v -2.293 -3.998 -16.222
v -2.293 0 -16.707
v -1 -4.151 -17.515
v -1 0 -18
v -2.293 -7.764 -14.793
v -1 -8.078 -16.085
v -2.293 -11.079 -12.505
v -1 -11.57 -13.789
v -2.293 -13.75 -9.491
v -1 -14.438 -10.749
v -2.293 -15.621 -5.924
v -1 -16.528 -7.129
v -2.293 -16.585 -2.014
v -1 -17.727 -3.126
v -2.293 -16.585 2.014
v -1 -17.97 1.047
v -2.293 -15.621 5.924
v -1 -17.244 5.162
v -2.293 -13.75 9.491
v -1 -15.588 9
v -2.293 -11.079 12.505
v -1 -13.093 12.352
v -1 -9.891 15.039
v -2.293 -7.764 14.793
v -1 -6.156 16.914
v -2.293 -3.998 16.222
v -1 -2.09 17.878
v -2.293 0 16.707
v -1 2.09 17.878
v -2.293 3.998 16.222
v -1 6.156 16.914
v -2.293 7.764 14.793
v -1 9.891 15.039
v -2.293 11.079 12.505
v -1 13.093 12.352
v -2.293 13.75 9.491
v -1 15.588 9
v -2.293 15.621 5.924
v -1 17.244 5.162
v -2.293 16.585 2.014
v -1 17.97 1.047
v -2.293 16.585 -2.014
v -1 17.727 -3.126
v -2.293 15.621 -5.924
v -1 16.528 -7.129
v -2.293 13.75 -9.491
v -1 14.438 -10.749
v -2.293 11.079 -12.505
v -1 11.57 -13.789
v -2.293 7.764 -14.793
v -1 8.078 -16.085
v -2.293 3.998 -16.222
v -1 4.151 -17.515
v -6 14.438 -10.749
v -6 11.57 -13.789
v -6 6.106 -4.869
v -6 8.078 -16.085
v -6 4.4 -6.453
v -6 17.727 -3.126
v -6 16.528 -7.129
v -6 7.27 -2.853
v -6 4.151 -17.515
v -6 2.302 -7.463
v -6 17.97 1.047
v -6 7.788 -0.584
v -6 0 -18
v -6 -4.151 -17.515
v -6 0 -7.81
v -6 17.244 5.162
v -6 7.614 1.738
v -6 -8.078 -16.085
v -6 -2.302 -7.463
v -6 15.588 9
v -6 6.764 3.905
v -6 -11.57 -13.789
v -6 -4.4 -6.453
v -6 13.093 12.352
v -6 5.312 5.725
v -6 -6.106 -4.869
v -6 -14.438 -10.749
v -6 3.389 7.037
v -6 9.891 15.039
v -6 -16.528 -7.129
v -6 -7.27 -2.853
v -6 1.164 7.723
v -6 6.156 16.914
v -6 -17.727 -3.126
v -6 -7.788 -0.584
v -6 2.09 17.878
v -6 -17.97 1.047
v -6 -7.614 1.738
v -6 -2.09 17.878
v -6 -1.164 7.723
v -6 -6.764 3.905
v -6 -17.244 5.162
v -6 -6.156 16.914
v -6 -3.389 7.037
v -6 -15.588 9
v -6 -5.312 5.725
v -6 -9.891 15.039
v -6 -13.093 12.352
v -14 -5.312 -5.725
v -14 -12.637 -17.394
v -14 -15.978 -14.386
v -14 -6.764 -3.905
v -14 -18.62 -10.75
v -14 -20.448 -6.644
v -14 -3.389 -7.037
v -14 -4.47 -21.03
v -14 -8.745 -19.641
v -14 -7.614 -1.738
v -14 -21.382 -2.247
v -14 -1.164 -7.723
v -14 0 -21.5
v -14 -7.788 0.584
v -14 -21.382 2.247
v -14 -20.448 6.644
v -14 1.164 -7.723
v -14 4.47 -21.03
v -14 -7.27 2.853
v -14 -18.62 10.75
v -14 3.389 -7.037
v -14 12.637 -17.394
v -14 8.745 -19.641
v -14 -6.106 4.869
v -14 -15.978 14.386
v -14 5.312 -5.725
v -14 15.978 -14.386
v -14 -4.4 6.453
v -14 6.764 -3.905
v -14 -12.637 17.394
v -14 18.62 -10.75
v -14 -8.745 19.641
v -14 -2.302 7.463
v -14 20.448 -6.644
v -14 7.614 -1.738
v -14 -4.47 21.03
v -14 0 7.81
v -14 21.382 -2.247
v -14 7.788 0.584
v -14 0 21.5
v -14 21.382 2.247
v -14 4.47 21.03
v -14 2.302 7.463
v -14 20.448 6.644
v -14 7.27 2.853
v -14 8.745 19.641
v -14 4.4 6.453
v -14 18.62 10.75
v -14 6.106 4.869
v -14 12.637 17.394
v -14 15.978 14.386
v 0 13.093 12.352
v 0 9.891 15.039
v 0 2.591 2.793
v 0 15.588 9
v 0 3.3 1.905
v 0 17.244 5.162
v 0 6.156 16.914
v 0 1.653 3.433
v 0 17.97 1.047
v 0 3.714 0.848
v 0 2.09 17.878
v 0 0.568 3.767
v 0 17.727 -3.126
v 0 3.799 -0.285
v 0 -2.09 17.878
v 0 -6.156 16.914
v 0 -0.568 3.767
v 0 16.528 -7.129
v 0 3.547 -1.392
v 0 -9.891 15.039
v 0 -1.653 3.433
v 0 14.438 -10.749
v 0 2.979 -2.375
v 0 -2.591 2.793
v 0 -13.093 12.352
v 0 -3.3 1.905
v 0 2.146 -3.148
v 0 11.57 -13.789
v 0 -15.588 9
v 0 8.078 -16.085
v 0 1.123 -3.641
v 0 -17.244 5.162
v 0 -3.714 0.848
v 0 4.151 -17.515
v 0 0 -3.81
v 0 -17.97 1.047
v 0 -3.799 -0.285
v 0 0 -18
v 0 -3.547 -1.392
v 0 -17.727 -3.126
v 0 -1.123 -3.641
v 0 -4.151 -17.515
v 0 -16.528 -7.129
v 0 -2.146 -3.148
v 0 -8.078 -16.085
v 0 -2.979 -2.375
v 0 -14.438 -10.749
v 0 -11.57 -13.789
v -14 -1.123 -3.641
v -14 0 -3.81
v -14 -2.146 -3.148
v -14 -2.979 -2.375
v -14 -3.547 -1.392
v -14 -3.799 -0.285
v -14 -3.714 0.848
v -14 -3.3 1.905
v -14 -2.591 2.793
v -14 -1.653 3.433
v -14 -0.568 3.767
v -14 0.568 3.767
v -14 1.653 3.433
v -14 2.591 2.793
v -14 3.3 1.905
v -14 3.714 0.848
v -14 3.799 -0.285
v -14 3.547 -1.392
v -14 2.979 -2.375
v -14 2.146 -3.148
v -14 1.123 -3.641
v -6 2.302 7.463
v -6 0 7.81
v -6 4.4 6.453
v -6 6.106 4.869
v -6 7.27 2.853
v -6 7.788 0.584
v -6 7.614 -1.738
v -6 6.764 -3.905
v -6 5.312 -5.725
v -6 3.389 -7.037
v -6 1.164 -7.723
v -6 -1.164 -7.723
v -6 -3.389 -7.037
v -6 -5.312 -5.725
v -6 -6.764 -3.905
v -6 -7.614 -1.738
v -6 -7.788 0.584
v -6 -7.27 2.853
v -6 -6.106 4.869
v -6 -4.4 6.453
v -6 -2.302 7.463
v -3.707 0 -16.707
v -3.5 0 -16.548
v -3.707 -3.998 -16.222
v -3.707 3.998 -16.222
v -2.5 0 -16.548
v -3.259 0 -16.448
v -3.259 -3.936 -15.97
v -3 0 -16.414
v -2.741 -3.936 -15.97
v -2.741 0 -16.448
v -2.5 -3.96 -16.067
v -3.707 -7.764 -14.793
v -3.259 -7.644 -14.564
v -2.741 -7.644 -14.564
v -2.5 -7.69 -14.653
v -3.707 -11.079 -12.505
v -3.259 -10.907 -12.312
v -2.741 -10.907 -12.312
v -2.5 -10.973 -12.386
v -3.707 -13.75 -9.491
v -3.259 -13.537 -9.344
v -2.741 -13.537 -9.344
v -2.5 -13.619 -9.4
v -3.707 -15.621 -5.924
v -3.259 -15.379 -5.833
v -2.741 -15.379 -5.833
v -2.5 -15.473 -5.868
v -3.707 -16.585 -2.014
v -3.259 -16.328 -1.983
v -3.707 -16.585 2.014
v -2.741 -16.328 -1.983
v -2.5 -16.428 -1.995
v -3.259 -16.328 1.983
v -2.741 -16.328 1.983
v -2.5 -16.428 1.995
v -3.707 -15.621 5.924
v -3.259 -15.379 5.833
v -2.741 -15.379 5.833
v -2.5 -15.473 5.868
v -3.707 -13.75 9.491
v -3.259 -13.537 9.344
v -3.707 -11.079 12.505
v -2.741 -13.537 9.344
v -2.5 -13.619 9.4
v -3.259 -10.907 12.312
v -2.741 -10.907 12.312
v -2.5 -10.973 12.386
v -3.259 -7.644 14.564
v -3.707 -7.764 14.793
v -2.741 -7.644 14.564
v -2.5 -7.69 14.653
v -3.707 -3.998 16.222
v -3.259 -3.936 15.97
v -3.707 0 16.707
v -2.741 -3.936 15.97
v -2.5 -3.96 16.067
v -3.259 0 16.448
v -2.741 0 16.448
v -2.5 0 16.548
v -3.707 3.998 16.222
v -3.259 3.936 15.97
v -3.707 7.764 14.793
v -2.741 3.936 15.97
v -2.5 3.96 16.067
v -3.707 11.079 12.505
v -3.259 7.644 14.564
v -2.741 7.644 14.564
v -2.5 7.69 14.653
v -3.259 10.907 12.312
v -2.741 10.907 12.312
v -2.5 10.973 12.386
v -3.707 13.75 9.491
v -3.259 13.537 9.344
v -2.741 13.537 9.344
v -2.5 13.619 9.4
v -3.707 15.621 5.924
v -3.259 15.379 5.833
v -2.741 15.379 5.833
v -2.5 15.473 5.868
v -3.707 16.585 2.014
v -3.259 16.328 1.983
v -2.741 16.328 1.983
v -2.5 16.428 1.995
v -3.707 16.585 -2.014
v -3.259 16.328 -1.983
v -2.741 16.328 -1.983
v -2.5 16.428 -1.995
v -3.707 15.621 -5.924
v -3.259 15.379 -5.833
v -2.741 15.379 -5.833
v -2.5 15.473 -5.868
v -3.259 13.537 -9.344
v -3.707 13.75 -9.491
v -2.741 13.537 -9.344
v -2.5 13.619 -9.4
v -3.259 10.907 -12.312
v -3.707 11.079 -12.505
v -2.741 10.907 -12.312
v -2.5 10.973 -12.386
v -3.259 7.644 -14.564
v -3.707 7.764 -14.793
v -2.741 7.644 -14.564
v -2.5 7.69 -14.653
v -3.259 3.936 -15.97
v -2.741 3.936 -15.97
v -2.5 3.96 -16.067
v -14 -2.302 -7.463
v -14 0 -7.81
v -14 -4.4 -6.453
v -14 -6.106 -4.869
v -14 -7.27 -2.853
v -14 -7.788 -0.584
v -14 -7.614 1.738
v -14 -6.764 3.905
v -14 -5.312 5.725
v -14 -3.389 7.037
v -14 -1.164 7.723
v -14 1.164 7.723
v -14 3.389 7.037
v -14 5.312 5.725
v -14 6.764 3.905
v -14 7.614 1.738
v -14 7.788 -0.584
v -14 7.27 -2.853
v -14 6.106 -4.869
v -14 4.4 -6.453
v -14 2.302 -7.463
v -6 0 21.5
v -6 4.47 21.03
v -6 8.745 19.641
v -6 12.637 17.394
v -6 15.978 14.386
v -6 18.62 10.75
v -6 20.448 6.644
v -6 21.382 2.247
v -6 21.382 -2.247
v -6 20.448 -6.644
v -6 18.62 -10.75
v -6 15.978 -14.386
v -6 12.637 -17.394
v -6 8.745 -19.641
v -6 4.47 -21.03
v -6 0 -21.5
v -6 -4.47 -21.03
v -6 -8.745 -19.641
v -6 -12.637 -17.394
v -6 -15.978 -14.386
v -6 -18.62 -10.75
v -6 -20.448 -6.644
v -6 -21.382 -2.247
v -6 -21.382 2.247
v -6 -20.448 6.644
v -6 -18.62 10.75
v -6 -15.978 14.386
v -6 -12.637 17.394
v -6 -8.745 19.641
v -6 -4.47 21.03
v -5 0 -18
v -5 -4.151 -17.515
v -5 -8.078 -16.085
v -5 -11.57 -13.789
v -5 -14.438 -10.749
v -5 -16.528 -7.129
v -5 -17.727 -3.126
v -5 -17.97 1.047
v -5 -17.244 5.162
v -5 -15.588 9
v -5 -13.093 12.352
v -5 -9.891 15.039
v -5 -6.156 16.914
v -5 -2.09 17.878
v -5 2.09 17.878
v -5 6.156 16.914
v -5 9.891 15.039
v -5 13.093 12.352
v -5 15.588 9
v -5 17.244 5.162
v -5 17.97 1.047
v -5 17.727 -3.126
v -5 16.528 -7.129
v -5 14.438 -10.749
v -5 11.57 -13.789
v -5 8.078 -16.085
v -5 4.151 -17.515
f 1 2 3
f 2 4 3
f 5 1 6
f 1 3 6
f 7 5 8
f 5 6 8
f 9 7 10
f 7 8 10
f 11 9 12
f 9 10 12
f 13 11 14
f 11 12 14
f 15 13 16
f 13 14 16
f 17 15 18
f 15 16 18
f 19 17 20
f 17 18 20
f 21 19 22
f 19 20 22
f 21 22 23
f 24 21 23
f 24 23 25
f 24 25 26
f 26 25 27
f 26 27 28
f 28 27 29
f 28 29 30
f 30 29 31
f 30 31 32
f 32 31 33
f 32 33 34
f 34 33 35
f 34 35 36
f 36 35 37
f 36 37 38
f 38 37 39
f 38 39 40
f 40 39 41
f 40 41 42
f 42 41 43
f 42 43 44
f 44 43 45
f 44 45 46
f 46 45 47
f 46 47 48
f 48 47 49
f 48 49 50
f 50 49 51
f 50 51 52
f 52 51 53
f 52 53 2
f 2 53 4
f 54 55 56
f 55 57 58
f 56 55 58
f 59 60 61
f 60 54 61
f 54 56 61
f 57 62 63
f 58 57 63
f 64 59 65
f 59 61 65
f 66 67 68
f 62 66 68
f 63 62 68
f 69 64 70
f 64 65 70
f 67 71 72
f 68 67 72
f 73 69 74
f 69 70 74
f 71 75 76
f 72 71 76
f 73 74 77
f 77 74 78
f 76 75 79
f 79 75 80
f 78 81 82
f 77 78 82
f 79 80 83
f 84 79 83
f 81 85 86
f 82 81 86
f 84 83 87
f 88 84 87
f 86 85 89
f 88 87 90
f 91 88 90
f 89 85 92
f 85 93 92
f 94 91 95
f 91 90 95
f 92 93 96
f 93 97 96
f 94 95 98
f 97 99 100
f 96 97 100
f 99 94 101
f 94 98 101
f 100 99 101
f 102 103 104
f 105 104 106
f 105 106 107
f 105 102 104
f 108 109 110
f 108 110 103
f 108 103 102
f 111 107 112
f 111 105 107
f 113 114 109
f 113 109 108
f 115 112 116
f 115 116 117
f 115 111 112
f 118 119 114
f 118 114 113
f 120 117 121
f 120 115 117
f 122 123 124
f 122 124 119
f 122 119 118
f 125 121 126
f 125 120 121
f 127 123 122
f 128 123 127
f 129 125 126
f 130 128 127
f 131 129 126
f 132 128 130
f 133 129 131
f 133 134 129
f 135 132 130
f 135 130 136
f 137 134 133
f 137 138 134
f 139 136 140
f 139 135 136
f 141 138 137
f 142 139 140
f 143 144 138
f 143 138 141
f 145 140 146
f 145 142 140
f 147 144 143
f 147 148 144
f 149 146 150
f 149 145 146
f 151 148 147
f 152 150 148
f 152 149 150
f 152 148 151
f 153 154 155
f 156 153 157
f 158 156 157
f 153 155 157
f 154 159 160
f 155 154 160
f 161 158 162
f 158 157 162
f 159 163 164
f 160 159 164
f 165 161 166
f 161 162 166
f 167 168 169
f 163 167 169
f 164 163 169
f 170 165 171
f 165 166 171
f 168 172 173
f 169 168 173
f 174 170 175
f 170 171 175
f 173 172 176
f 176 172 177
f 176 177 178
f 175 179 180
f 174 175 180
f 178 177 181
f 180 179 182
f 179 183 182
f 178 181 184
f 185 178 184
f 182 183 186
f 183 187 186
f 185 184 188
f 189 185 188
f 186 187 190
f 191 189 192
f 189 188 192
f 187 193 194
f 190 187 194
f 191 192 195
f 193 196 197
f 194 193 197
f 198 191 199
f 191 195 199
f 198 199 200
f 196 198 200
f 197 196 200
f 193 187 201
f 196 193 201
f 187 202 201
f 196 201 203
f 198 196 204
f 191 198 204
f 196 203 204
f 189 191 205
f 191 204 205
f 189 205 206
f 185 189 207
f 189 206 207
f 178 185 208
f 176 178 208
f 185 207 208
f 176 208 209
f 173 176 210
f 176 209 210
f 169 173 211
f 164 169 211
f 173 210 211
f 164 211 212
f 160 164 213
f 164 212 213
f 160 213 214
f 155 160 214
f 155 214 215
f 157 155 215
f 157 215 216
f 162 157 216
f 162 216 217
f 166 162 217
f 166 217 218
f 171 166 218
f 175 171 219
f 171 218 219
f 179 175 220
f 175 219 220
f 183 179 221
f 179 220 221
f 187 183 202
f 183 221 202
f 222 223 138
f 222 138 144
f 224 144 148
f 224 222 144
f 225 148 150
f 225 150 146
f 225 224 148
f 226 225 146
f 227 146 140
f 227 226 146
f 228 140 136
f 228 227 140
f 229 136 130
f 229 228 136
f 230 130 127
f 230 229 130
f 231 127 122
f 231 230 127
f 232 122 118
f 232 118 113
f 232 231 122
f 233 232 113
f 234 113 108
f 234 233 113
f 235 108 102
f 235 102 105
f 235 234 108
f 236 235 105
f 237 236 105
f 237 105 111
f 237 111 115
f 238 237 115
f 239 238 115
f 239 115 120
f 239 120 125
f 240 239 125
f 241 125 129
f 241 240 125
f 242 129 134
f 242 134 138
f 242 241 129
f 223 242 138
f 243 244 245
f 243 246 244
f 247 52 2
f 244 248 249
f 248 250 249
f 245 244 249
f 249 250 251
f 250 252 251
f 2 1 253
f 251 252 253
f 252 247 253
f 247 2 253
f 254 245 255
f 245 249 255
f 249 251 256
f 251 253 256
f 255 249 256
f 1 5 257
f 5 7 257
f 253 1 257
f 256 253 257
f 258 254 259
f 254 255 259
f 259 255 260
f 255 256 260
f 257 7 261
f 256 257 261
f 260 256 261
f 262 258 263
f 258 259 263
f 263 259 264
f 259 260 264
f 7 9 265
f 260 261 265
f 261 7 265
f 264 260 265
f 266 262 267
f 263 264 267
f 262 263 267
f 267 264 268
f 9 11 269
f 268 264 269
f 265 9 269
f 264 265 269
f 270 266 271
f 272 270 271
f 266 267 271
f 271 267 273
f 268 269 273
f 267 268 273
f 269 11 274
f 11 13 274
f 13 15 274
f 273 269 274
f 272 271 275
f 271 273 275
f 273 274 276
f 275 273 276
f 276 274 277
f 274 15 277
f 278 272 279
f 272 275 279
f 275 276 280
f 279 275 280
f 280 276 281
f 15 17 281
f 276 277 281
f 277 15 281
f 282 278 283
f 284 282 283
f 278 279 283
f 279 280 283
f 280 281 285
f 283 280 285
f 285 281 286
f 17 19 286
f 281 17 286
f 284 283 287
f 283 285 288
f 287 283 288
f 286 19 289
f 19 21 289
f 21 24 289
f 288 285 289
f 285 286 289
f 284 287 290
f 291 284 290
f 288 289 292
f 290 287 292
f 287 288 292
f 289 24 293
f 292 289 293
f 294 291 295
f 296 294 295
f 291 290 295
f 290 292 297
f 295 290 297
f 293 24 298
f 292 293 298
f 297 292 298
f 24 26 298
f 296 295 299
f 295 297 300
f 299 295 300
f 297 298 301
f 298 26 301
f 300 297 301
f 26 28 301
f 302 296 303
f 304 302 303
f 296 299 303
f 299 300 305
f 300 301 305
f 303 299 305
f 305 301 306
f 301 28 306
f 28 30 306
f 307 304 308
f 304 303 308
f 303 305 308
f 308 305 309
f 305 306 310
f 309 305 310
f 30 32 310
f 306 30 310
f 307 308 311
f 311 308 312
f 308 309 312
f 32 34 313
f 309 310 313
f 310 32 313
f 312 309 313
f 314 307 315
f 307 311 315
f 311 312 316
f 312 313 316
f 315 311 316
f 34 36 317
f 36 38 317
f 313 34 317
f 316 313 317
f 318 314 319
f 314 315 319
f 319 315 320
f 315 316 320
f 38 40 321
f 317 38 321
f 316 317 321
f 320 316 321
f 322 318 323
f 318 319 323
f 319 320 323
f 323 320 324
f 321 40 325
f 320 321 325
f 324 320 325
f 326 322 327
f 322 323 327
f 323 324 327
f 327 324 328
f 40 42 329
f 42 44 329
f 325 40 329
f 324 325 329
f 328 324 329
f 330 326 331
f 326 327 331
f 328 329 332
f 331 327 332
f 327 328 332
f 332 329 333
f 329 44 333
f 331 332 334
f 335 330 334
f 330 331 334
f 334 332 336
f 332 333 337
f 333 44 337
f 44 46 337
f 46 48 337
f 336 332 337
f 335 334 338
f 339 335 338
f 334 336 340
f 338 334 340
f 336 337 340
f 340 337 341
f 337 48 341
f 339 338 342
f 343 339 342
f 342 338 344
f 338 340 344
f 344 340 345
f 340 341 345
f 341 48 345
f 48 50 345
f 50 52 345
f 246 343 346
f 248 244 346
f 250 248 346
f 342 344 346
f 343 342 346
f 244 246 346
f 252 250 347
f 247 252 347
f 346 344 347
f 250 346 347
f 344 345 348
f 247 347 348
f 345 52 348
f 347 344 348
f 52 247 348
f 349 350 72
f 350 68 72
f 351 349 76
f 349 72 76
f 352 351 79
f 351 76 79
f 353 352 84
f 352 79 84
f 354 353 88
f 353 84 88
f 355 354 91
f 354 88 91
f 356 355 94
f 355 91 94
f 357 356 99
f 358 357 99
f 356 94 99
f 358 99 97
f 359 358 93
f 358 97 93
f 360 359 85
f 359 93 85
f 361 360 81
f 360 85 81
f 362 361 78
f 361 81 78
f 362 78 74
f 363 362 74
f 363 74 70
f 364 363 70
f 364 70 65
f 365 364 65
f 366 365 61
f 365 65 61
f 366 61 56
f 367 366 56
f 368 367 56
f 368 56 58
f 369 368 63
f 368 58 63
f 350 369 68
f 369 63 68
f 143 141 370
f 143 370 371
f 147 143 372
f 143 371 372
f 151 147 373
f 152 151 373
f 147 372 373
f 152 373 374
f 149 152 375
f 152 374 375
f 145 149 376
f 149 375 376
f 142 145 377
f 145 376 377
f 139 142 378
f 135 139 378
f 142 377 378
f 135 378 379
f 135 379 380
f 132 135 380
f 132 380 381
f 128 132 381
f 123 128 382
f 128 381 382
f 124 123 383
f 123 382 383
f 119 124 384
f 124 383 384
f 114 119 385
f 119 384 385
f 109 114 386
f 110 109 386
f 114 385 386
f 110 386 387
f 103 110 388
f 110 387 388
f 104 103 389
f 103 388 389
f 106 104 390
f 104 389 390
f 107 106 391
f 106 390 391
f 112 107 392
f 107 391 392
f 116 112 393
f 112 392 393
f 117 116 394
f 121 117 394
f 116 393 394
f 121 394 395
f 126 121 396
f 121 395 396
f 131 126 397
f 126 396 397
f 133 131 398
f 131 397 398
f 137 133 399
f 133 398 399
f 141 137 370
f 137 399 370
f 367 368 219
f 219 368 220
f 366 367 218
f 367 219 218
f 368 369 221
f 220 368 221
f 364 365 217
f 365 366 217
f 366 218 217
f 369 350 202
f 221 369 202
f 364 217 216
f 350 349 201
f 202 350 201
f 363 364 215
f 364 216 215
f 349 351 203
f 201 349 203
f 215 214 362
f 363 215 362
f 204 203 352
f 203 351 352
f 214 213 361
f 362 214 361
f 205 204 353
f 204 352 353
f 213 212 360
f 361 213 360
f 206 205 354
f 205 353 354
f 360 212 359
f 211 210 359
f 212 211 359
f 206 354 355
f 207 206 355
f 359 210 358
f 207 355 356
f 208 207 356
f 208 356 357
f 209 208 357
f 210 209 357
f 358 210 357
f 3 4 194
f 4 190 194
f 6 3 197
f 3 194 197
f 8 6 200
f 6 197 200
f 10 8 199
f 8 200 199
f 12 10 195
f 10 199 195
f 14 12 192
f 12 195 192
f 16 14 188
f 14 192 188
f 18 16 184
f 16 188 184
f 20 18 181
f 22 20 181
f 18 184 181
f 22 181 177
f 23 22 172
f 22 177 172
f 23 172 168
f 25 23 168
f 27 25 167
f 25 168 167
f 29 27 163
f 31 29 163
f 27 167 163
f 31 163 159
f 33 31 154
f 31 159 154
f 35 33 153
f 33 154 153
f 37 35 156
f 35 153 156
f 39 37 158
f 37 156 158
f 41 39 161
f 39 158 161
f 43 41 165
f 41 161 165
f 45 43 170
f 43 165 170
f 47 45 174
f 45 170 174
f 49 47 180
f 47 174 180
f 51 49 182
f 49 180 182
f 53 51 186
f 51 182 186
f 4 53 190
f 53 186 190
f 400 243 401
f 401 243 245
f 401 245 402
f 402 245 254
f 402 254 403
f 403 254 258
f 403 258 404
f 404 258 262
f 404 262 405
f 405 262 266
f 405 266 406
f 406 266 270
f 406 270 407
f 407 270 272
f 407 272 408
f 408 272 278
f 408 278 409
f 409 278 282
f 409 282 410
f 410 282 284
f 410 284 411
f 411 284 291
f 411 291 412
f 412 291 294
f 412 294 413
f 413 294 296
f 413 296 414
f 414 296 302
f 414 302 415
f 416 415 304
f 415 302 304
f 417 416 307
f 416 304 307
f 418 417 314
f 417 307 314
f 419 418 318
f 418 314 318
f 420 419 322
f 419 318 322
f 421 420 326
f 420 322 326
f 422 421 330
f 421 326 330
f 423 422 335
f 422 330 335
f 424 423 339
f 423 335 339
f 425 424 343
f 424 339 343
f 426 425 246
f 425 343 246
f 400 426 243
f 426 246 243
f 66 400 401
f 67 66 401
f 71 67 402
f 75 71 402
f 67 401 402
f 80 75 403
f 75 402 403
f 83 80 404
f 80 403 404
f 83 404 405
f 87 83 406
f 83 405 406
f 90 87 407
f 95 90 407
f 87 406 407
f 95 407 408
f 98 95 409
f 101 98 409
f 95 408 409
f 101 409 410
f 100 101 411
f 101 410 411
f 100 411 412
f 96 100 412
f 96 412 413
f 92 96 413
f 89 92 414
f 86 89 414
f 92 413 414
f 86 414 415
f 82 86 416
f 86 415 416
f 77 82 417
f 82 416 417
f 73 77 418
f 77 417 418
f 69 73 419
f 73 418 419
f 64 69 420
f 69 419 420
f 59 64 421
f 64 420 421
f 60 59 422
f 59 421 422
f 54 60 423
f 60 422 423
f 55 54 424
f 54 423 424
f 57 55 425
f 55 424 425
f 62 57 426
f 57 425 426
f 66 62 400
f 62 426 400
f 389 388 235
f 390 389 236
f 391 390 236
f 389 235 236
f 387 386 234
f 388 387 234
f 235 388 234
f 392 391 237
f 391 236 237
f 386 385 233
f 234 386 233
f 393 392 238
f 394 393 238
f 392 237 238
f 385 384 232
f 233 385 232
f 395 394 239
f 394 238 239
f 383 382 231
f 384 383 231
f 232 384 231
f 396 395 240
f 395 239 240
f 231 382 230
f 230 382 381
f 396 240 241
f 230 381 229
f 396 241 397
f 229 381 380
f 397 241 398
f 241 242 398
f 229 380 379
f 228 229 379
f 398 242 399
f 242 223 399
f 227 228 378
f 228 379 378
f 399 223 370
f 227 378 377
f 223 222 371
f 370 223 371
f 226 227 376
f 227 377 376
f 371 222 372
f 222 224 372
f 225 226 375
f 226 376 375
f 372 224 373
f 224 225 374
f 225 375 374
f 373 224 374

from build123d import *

# Parameters (mm, degrees)
SKETCH3_R           = 21.5
SKETCH3_R_2         = 7.81
BOSS_EXTRUDE1_DEPTH = 8


with BuildPart() as part:
    # Sketch1 → Revolve1 (revolve)
    with BuildSketch(Plane.XY, mode=Mode.PRIVATE) as revolve1_sk:
        Polygon((0, 3.81), (-14, 3.81), (-14, 7.81), (-6, 7.81), (-6, 18), (0, 18), align=None)
    revolve(revolve1_sk.sketch.rotate(Axis((0, 0, 0), (-1, 0, 0)), 90), axis=Axis((0, 0, 0), (-1, 0, 0)))

    # Sketch2 → Cut-Revolve1 (revolve, cut)
    with BuildSketch(Plane(origin=(0, 0, 0), x_dir=(1, 0, 0), z_dir=(0, 1, 0))):
        with BuildLine():
            Line((-5, 18), (-3.707106781, 16.707106781))
            ThreePointArc((-3.707106781, 16.707106781), (-3, 16.414213562), (-2.292893219, 16.707106781))
            Line((-2.292893219, 16.707106781), (-1, 18))
            Line((-1, 18), (-5, 18))
        make_face()
    revolve(axis=Axis((0, 0, 0), (-1, 0, 0)), mode=Mode.SUBTRACT)


with BuildPart() as body_2:
    # Sketch3 → Boss-Extrude1 (new body)
    with BuildSketch(Plane.ZY.offset(6)):
        Circle(SKETCH3_R)
        Circle(SKETCH3_R_2, mode=Mode.SUBTRACT)
    extrude(amount=BOSS_EXTRUDE1_DEPTH)


solid = Compound([part.part, body_2.part])
